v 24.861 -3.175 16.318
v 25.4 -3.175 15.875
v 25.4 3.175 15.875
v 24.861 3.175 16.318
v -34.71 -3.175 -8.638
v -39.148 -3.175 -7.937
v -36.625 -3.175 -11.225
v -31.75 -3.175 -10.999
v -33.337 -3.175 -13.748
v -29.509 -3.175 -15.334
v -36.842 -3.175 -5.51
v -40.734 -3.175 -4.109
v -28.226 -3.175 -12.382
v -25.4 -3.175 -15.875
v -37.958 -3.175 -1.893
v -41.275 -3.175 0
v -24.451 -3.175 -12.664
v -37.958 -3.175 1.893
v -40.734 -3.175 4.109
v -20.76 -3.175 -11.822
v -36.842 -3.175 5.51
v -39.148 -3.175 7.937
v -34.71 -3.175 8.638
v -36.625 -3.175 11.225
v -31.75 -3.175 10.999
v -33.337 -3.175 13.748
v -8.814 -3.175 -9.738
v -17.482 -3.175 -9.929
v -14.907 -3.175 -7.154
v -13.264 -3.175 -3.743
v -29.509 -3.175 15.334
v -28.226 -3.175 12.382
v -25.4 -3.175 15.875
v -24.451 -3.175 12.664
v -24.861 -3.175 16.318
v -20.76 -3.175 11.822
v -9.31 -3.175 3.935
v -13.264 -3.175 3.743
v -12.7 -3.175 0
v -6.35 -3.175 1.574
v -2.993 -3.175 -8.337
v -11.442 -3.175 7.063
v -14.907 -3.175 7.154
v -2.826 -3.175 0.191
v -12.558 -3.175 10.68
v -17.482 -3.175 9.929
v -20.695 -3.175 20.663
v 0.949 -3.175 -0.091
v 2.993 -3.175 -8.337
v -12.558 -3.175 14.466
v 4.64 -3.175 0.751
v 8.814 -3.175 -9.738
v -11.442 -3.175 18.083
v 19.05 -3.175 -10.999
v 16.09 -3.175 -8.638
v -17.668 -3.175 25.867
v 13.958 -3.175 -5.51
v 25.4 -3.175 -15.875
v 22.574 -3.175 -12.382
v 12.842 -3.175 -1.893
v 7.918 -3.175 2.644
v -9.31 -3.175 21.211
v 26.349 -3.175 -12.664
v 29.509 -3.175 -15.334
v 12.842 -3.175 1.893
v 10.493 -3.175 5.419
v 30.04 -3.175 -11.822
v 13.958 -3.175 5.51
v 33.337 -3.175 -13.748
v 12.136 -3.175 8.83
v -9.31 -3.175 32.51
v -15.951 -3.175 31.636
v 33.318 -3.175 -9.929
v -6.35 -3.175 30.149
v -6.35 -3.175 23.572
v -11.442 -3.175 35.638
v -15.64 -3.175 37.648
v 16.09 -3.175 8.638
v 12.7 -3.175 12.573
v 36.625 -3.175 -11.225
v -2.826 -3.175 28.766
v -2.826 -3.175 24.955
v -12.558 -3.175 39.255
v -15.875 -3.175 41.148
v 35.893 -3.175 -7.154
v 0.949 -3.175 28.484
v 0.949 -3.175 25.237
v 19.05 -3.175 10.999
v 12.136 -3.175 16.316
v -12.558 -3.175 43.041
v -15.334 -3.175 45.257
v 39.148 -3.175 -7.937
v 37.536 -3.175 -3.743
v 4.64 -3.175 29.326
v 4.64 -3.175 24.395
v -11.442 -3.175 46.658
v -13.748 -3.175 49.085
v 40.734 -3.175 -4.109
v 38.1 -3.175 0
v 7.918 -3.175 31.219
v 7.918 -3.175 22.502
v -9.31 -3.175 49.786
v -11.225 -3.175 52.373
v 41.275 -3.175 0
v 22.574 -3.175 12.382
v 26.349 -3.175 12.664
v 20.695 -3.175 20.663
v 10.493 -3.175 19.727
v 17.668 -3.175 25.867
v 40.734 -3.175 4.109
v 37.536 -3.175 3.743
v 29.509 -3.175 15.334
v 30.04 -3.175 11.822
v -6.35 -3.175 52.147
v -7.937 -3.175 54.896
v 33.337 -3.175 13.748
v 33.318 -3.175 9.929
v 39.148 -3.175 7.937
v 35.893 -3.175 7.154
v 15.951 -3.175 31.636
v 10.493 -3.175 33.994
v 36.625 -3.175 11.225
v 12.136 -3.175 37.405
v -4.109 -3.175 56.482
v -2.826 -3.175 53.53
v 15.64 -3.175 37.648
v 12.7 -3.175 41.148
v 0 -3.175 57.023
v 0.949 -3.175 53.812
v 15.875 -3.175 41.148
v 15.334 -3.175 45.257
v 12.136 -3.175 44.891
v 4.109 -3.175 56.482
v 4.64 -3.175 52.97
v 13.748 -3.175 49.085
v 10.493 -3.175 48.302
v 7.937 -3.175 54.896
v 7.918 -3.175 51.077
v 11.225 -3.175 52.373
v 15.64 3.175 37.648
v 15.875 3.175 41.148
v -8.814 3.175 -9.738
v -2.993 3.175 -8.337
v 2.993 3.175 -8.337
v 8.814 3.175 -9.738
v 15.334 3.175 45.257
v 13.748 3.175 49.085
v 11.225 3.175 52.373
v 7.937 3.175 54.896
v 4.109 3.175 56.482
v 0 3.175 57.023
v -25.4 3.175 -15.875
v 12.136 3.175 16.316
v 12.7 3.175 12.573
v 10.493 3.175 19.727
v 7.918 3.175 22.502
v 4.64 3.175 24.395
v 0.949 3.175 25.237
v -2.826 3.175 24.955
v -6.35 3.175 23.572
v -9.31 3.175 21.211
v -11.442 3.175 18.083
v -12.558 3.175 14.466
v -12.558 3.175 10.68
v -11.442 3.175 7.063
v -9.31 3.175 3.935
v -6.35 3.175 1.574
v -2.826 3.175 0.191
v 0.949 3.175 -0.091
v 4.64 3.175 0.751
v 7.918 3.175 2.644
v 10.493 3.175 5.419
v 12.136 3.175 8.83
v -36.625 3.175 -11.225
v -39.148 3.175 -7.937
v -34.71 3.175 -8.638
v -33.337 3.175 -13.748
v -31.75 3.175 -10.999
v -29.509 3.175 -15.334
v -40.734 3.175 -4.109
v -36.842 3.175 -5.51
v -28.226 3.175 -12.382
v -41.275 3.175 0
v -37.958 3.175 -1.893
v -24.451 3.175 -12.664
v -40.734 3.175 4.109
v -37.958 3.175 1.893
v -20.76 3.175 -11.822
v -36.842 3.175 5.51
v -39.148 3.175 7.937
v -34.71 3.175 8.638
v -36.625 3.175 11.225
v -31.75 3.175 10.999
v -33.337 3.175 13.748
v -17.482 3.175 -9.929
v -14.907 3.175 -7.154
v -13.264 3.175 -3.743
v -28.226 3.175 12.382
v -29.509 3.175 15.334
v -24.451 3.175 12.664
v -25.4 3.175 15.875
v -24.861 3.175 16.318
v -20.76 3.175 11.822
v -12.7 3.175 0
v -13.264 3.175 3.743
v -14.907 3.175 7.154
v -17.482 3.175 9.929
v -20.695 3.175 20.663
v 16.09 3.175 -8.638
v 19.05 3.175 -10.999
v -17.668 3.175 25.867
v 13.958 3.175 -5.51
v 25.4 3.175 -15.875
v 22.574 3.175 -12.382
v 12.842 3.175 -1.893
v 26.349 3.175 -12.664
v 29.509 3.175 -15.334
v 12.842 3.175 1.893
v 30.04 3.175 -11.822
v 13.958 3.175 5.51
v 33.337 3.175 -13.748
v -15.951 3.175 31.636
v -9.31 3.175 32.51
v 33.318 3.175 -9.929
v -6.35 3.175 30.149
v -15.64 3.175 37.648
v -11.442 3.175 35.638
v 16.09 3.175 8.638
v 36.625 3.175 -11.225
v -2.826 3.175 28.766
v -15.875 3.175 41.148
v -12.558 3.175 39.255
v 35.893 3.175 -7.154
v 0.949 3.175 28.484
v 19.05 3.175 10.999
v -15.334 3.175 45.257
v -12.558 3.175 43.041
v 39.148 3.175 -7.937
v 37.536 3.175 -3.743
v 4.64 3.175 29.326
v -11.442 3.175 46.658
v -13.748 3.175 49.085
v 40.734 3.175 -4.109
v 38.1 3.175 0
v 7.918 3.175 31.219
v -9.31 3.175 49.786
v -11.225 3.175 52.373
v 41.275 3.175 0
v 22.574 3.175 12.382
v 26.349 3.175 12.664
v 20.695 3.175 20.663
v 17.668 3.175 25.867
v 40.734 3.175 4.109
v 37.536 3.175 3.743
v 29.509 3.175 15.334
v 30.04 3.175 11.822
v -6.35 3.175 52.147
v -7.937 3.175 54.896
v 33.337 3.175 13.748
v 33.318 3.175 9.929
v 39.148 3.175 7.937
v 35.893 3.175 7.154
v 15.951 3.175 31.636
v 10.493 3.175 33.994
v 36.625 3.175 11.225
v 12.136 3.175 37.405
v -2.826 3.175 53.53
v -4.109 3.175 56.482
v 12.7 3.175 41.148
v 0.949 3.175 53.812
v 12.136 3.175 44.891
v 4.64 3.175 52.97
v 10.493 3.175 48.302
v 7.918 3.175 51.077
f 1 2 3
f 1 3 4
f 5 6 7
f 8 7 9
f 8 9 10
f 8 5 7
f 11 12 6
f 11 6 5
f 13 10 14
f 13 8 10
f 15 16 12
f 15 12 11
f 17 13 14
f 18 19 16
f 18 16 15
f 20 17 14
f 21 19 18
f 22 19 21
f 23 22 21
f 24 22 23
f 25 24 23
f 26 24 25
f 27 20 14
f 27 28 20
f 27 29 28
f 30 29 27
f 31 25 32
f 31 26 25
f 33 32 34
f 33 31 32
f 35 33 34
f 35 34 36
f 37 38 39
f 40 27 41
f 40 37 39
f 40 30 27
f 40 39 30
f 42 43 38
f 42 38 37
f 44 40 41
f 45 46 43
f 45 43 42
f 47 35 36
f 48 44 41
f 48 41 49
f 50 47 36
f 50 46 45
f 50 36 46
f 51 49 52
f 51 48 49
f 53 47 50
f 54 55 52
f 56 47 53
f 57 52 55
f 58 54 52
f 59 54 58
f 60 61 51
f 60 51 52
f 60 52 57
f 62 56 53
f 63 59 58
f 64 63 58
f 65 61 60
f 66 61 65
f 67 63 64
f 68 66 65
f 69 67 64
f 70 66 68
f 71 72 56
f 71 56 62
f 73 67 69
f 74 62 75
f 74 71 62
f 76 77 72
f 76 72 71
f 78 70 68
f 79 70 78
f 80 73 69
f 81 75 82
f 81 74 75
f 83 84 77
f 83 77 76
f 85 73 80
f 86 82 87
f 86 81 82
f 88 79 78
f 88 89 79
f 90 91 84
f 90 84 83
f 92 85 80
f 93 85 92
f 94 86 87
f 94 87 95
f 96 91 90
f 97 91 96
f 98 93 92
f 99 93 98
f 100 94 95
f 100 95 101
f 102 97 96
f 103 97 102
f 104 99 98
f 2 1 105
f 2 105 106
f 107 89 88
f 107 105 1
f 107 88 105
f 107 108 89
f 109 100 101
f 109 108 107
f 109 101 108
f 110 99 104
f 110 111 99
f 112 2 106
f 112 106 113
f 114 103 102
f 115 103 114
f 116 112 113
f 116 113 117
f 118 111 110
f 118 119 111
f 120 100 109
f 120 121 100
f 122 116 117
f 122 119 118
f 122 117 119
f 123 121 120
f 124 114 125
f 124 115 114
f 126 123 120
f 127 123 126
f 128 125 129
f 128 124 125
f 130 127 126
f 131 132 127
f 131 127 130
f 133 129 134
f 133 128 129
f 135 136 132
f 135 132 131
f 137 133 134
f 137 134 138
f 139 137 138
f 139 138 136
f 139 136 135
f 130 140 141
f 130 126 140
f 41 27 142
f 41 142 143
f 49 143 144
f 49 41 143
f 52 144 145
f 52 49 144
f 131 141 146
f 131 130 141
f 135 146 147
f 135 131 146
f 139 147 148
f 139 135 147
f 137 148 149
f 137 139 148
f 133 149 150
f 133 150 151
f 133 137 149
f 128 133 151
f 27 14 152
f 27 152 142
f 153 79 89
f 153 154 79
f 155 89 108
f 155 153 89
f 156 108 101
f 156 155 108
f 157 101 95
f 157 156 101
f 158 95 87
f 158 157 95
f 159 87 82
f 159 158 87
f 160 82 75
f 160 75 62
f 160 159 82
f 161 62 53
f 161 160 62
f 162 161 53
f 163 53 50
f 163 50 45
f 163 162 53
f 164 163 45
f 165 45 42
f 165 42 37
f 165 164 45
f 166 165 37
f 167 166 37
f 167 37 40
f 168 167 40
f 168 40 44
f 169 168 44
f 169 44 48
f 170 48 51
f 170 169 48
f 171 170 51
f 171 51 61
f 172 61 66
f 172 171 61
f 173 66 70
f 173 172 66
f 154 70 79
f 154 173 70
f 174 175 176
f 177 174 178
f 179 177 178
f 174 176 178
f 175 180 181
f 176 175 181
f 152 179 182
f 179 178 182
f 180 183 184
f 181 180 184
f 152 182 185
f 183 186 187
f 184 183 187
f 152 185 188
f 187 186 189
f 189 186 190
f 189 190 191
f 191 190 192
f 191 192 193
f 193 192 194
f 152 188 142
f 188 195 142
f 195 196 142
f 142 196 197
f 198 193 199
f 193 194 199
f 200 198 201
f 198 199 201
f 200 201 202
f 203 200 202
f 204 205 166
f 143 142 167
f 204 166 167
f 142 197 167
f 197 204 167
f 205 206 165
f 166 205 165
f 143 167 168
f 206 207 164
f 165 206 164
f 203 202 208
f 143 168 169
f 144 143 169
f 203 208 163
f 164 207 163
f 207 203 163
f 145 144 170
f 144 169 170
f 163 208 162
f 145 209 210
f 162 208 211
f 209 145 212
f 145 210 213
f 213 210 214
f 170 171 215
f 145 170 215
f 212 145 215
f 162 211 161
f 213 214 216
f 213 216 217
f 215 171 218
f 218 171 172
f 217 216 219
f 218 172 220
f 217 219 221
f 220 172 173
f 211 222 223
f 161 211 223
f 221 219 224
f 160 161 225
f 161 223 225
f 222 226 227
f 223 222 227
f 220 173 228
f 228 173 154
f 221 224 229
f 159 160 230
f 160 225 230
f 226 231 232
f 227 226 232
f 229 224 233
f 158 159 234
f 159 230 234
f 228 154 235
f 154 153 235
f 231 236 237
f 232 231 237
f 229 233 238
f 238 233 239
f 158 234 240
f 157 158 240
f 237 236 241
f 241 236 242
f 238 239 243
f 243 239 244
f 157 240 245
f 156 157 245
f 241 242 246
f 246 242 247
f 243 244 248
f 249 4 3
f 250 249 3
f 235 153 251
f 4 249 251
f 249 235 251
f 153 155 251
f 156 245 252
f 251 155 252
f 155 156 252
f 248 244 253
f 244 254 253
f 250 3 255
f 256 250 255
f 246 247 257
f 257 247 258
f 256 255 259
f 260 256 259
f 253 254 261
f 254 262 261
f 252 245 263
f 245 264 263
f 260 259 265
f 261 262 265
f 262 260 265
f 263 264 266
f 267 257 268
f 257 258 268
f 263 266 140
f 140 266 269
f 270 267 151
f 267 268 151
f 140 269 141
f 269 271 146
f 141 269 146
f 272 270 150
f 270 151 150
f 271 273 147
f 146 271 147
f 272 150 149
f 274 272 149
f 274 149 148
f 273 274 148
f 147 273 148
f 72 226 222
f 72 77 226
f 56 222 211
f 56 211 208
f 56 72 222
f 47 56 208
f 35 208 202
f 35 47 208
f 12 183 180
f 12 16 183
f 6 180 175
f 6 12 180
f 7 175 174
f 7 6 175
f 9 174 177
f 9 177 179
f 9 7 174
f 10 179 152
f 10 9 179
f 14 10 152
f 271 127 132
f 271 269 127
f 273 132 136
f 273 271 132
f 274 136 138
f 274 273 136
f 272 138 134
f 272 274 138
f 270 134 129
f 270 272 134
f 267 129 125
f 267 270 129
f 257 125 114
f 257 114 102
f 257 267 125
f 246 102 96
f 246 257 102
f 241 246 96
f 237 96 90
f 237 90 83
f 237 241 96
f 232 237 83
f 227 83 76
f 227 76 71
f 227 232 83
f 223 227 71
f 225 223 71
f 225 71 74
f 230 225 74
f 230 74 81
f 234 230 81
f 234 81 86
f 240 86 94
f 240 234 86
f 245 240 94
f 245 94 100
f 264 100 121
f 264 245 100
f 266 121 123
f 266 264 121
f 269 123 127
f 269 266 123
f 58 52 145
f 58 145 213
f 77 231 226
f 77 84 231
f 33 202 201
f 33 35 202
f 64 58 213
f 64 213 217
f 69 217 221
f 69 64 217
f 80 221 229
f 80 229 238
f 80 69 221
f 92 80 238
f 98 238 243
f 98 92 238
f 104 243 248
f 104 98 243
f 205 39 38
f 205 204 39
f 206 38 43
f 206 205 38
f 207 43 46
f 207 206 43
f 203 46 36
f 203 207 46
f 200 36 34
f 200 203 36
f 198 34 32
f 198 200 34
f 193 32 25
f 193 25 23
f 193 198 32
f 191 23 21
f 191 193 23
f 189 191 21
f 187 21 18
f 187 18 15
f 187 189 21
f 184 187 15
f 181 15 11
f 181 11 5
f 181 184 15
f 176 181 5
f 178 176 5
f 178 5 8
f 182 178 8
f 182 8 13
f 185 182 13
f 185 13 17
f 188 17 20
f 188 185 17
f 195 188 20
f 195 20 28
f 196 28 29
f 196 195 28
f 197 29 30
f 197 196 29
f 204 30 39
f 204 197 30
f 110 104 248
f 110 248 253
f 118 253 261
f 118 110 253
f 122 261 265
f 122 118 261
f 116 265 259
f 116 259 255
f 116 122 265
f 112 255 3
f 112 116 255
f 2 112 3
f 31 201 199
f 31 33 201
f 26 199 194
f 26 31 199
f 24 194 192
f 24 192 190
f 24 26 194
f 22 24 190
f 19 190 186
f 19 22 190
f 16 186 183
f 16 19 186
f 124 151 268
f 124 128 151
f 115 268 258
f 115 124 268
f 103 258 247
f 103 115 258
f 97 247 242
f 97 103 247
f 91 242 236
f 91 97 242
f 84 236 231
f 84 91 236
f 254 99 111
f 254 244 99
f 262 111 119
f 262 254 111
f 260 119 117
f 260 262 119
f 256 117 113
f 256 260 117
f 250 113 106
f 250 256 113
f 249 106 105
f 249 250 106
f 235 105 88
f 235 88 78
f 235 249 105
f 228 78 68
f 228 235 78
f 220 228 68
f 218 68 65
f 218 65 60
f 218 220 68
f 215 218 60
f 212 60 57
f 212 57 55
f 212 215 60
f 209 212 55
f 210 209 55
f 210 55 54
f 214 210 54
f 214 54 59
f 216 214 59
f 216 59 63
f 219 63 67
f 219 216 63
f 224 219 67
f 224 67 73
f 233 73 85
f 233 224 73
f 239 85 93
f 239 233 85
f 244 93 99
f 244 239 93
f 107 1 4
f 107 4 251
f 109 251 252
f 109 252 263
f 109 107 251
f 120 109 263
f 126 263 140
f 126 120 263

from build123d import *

# Parameters (mm, degrees)
F0_R     = 12.7
F1_DEPTH = 3.175


with BuildPart() as f1:
    # F0 (on Front) → F1 (new body, symmetric)
    with BuildSketch(Plane.XZ):
        with BuildLine():
            ThreePointArc((-41.275, 0), (-36.62532, -11.22532), (-25.4, -15.875))
            Line((-25.4, -15.875), (-8.814026, -9.738189))
            ThreePointArc((-8.814026, -9.738189), (0, -8.15988), (8.814026, -9.738189))
            Line((8.814026, -9.738189), (25.4, -15.875))
            ThreePointArc((25.4, -15.875), (36.62532, -11.22532), (41.275, 0))
            ThreePointArc((41.275, 0), (36.62532, 11.22532), (25.4, 15.875))
            Line((25.4, 15.875), (24.860597, 16.31807))
            ThreePointArc((24.860597, 16.31807), (17.667983, 25.866743), (15.639876, 37.647984))
            Line((15.639876, 37.647984), (15.875, 41.148))
            ThreePointArc((15.875, 41.148), (11.22532, 52.37332), (0, 57.023))
            ThreePointArc((0, 57.023), (-11.22532, 52.37332), (-15.875, 41.148))
            Line((-15.875, 41.148), (-15.639876, 37.647984))
            ThreePointArc((-15.639876, 37.647984), (-17.667983, 25.866743), (-24.860597, 16.31807))
            Line((-24.860597, 16.31807), (-25.4, 15.875))
            ThreePointArc((-25.4, 15.875), (-36.62532, 11.22532), (-41.275, 0))
        make_face()
        with Locations((-25.4, 0)):
            Circle(F0_R, mode=Mode.SUBTRACT)
        with Locations((25.4, 0)):
            Circle(F0_R, mode=Mode.SUBTRACT)
        with Locations((0, 12.573)):
            Circle(F0_R, mode=Mode.SUBTRACT)
        with Locations((0, 41.148)):
            Circle(F0_R, mode=Mode.SUBTRACT)
    extrude(amount=F1_DEPTH, both=True)


solid = f1.part
